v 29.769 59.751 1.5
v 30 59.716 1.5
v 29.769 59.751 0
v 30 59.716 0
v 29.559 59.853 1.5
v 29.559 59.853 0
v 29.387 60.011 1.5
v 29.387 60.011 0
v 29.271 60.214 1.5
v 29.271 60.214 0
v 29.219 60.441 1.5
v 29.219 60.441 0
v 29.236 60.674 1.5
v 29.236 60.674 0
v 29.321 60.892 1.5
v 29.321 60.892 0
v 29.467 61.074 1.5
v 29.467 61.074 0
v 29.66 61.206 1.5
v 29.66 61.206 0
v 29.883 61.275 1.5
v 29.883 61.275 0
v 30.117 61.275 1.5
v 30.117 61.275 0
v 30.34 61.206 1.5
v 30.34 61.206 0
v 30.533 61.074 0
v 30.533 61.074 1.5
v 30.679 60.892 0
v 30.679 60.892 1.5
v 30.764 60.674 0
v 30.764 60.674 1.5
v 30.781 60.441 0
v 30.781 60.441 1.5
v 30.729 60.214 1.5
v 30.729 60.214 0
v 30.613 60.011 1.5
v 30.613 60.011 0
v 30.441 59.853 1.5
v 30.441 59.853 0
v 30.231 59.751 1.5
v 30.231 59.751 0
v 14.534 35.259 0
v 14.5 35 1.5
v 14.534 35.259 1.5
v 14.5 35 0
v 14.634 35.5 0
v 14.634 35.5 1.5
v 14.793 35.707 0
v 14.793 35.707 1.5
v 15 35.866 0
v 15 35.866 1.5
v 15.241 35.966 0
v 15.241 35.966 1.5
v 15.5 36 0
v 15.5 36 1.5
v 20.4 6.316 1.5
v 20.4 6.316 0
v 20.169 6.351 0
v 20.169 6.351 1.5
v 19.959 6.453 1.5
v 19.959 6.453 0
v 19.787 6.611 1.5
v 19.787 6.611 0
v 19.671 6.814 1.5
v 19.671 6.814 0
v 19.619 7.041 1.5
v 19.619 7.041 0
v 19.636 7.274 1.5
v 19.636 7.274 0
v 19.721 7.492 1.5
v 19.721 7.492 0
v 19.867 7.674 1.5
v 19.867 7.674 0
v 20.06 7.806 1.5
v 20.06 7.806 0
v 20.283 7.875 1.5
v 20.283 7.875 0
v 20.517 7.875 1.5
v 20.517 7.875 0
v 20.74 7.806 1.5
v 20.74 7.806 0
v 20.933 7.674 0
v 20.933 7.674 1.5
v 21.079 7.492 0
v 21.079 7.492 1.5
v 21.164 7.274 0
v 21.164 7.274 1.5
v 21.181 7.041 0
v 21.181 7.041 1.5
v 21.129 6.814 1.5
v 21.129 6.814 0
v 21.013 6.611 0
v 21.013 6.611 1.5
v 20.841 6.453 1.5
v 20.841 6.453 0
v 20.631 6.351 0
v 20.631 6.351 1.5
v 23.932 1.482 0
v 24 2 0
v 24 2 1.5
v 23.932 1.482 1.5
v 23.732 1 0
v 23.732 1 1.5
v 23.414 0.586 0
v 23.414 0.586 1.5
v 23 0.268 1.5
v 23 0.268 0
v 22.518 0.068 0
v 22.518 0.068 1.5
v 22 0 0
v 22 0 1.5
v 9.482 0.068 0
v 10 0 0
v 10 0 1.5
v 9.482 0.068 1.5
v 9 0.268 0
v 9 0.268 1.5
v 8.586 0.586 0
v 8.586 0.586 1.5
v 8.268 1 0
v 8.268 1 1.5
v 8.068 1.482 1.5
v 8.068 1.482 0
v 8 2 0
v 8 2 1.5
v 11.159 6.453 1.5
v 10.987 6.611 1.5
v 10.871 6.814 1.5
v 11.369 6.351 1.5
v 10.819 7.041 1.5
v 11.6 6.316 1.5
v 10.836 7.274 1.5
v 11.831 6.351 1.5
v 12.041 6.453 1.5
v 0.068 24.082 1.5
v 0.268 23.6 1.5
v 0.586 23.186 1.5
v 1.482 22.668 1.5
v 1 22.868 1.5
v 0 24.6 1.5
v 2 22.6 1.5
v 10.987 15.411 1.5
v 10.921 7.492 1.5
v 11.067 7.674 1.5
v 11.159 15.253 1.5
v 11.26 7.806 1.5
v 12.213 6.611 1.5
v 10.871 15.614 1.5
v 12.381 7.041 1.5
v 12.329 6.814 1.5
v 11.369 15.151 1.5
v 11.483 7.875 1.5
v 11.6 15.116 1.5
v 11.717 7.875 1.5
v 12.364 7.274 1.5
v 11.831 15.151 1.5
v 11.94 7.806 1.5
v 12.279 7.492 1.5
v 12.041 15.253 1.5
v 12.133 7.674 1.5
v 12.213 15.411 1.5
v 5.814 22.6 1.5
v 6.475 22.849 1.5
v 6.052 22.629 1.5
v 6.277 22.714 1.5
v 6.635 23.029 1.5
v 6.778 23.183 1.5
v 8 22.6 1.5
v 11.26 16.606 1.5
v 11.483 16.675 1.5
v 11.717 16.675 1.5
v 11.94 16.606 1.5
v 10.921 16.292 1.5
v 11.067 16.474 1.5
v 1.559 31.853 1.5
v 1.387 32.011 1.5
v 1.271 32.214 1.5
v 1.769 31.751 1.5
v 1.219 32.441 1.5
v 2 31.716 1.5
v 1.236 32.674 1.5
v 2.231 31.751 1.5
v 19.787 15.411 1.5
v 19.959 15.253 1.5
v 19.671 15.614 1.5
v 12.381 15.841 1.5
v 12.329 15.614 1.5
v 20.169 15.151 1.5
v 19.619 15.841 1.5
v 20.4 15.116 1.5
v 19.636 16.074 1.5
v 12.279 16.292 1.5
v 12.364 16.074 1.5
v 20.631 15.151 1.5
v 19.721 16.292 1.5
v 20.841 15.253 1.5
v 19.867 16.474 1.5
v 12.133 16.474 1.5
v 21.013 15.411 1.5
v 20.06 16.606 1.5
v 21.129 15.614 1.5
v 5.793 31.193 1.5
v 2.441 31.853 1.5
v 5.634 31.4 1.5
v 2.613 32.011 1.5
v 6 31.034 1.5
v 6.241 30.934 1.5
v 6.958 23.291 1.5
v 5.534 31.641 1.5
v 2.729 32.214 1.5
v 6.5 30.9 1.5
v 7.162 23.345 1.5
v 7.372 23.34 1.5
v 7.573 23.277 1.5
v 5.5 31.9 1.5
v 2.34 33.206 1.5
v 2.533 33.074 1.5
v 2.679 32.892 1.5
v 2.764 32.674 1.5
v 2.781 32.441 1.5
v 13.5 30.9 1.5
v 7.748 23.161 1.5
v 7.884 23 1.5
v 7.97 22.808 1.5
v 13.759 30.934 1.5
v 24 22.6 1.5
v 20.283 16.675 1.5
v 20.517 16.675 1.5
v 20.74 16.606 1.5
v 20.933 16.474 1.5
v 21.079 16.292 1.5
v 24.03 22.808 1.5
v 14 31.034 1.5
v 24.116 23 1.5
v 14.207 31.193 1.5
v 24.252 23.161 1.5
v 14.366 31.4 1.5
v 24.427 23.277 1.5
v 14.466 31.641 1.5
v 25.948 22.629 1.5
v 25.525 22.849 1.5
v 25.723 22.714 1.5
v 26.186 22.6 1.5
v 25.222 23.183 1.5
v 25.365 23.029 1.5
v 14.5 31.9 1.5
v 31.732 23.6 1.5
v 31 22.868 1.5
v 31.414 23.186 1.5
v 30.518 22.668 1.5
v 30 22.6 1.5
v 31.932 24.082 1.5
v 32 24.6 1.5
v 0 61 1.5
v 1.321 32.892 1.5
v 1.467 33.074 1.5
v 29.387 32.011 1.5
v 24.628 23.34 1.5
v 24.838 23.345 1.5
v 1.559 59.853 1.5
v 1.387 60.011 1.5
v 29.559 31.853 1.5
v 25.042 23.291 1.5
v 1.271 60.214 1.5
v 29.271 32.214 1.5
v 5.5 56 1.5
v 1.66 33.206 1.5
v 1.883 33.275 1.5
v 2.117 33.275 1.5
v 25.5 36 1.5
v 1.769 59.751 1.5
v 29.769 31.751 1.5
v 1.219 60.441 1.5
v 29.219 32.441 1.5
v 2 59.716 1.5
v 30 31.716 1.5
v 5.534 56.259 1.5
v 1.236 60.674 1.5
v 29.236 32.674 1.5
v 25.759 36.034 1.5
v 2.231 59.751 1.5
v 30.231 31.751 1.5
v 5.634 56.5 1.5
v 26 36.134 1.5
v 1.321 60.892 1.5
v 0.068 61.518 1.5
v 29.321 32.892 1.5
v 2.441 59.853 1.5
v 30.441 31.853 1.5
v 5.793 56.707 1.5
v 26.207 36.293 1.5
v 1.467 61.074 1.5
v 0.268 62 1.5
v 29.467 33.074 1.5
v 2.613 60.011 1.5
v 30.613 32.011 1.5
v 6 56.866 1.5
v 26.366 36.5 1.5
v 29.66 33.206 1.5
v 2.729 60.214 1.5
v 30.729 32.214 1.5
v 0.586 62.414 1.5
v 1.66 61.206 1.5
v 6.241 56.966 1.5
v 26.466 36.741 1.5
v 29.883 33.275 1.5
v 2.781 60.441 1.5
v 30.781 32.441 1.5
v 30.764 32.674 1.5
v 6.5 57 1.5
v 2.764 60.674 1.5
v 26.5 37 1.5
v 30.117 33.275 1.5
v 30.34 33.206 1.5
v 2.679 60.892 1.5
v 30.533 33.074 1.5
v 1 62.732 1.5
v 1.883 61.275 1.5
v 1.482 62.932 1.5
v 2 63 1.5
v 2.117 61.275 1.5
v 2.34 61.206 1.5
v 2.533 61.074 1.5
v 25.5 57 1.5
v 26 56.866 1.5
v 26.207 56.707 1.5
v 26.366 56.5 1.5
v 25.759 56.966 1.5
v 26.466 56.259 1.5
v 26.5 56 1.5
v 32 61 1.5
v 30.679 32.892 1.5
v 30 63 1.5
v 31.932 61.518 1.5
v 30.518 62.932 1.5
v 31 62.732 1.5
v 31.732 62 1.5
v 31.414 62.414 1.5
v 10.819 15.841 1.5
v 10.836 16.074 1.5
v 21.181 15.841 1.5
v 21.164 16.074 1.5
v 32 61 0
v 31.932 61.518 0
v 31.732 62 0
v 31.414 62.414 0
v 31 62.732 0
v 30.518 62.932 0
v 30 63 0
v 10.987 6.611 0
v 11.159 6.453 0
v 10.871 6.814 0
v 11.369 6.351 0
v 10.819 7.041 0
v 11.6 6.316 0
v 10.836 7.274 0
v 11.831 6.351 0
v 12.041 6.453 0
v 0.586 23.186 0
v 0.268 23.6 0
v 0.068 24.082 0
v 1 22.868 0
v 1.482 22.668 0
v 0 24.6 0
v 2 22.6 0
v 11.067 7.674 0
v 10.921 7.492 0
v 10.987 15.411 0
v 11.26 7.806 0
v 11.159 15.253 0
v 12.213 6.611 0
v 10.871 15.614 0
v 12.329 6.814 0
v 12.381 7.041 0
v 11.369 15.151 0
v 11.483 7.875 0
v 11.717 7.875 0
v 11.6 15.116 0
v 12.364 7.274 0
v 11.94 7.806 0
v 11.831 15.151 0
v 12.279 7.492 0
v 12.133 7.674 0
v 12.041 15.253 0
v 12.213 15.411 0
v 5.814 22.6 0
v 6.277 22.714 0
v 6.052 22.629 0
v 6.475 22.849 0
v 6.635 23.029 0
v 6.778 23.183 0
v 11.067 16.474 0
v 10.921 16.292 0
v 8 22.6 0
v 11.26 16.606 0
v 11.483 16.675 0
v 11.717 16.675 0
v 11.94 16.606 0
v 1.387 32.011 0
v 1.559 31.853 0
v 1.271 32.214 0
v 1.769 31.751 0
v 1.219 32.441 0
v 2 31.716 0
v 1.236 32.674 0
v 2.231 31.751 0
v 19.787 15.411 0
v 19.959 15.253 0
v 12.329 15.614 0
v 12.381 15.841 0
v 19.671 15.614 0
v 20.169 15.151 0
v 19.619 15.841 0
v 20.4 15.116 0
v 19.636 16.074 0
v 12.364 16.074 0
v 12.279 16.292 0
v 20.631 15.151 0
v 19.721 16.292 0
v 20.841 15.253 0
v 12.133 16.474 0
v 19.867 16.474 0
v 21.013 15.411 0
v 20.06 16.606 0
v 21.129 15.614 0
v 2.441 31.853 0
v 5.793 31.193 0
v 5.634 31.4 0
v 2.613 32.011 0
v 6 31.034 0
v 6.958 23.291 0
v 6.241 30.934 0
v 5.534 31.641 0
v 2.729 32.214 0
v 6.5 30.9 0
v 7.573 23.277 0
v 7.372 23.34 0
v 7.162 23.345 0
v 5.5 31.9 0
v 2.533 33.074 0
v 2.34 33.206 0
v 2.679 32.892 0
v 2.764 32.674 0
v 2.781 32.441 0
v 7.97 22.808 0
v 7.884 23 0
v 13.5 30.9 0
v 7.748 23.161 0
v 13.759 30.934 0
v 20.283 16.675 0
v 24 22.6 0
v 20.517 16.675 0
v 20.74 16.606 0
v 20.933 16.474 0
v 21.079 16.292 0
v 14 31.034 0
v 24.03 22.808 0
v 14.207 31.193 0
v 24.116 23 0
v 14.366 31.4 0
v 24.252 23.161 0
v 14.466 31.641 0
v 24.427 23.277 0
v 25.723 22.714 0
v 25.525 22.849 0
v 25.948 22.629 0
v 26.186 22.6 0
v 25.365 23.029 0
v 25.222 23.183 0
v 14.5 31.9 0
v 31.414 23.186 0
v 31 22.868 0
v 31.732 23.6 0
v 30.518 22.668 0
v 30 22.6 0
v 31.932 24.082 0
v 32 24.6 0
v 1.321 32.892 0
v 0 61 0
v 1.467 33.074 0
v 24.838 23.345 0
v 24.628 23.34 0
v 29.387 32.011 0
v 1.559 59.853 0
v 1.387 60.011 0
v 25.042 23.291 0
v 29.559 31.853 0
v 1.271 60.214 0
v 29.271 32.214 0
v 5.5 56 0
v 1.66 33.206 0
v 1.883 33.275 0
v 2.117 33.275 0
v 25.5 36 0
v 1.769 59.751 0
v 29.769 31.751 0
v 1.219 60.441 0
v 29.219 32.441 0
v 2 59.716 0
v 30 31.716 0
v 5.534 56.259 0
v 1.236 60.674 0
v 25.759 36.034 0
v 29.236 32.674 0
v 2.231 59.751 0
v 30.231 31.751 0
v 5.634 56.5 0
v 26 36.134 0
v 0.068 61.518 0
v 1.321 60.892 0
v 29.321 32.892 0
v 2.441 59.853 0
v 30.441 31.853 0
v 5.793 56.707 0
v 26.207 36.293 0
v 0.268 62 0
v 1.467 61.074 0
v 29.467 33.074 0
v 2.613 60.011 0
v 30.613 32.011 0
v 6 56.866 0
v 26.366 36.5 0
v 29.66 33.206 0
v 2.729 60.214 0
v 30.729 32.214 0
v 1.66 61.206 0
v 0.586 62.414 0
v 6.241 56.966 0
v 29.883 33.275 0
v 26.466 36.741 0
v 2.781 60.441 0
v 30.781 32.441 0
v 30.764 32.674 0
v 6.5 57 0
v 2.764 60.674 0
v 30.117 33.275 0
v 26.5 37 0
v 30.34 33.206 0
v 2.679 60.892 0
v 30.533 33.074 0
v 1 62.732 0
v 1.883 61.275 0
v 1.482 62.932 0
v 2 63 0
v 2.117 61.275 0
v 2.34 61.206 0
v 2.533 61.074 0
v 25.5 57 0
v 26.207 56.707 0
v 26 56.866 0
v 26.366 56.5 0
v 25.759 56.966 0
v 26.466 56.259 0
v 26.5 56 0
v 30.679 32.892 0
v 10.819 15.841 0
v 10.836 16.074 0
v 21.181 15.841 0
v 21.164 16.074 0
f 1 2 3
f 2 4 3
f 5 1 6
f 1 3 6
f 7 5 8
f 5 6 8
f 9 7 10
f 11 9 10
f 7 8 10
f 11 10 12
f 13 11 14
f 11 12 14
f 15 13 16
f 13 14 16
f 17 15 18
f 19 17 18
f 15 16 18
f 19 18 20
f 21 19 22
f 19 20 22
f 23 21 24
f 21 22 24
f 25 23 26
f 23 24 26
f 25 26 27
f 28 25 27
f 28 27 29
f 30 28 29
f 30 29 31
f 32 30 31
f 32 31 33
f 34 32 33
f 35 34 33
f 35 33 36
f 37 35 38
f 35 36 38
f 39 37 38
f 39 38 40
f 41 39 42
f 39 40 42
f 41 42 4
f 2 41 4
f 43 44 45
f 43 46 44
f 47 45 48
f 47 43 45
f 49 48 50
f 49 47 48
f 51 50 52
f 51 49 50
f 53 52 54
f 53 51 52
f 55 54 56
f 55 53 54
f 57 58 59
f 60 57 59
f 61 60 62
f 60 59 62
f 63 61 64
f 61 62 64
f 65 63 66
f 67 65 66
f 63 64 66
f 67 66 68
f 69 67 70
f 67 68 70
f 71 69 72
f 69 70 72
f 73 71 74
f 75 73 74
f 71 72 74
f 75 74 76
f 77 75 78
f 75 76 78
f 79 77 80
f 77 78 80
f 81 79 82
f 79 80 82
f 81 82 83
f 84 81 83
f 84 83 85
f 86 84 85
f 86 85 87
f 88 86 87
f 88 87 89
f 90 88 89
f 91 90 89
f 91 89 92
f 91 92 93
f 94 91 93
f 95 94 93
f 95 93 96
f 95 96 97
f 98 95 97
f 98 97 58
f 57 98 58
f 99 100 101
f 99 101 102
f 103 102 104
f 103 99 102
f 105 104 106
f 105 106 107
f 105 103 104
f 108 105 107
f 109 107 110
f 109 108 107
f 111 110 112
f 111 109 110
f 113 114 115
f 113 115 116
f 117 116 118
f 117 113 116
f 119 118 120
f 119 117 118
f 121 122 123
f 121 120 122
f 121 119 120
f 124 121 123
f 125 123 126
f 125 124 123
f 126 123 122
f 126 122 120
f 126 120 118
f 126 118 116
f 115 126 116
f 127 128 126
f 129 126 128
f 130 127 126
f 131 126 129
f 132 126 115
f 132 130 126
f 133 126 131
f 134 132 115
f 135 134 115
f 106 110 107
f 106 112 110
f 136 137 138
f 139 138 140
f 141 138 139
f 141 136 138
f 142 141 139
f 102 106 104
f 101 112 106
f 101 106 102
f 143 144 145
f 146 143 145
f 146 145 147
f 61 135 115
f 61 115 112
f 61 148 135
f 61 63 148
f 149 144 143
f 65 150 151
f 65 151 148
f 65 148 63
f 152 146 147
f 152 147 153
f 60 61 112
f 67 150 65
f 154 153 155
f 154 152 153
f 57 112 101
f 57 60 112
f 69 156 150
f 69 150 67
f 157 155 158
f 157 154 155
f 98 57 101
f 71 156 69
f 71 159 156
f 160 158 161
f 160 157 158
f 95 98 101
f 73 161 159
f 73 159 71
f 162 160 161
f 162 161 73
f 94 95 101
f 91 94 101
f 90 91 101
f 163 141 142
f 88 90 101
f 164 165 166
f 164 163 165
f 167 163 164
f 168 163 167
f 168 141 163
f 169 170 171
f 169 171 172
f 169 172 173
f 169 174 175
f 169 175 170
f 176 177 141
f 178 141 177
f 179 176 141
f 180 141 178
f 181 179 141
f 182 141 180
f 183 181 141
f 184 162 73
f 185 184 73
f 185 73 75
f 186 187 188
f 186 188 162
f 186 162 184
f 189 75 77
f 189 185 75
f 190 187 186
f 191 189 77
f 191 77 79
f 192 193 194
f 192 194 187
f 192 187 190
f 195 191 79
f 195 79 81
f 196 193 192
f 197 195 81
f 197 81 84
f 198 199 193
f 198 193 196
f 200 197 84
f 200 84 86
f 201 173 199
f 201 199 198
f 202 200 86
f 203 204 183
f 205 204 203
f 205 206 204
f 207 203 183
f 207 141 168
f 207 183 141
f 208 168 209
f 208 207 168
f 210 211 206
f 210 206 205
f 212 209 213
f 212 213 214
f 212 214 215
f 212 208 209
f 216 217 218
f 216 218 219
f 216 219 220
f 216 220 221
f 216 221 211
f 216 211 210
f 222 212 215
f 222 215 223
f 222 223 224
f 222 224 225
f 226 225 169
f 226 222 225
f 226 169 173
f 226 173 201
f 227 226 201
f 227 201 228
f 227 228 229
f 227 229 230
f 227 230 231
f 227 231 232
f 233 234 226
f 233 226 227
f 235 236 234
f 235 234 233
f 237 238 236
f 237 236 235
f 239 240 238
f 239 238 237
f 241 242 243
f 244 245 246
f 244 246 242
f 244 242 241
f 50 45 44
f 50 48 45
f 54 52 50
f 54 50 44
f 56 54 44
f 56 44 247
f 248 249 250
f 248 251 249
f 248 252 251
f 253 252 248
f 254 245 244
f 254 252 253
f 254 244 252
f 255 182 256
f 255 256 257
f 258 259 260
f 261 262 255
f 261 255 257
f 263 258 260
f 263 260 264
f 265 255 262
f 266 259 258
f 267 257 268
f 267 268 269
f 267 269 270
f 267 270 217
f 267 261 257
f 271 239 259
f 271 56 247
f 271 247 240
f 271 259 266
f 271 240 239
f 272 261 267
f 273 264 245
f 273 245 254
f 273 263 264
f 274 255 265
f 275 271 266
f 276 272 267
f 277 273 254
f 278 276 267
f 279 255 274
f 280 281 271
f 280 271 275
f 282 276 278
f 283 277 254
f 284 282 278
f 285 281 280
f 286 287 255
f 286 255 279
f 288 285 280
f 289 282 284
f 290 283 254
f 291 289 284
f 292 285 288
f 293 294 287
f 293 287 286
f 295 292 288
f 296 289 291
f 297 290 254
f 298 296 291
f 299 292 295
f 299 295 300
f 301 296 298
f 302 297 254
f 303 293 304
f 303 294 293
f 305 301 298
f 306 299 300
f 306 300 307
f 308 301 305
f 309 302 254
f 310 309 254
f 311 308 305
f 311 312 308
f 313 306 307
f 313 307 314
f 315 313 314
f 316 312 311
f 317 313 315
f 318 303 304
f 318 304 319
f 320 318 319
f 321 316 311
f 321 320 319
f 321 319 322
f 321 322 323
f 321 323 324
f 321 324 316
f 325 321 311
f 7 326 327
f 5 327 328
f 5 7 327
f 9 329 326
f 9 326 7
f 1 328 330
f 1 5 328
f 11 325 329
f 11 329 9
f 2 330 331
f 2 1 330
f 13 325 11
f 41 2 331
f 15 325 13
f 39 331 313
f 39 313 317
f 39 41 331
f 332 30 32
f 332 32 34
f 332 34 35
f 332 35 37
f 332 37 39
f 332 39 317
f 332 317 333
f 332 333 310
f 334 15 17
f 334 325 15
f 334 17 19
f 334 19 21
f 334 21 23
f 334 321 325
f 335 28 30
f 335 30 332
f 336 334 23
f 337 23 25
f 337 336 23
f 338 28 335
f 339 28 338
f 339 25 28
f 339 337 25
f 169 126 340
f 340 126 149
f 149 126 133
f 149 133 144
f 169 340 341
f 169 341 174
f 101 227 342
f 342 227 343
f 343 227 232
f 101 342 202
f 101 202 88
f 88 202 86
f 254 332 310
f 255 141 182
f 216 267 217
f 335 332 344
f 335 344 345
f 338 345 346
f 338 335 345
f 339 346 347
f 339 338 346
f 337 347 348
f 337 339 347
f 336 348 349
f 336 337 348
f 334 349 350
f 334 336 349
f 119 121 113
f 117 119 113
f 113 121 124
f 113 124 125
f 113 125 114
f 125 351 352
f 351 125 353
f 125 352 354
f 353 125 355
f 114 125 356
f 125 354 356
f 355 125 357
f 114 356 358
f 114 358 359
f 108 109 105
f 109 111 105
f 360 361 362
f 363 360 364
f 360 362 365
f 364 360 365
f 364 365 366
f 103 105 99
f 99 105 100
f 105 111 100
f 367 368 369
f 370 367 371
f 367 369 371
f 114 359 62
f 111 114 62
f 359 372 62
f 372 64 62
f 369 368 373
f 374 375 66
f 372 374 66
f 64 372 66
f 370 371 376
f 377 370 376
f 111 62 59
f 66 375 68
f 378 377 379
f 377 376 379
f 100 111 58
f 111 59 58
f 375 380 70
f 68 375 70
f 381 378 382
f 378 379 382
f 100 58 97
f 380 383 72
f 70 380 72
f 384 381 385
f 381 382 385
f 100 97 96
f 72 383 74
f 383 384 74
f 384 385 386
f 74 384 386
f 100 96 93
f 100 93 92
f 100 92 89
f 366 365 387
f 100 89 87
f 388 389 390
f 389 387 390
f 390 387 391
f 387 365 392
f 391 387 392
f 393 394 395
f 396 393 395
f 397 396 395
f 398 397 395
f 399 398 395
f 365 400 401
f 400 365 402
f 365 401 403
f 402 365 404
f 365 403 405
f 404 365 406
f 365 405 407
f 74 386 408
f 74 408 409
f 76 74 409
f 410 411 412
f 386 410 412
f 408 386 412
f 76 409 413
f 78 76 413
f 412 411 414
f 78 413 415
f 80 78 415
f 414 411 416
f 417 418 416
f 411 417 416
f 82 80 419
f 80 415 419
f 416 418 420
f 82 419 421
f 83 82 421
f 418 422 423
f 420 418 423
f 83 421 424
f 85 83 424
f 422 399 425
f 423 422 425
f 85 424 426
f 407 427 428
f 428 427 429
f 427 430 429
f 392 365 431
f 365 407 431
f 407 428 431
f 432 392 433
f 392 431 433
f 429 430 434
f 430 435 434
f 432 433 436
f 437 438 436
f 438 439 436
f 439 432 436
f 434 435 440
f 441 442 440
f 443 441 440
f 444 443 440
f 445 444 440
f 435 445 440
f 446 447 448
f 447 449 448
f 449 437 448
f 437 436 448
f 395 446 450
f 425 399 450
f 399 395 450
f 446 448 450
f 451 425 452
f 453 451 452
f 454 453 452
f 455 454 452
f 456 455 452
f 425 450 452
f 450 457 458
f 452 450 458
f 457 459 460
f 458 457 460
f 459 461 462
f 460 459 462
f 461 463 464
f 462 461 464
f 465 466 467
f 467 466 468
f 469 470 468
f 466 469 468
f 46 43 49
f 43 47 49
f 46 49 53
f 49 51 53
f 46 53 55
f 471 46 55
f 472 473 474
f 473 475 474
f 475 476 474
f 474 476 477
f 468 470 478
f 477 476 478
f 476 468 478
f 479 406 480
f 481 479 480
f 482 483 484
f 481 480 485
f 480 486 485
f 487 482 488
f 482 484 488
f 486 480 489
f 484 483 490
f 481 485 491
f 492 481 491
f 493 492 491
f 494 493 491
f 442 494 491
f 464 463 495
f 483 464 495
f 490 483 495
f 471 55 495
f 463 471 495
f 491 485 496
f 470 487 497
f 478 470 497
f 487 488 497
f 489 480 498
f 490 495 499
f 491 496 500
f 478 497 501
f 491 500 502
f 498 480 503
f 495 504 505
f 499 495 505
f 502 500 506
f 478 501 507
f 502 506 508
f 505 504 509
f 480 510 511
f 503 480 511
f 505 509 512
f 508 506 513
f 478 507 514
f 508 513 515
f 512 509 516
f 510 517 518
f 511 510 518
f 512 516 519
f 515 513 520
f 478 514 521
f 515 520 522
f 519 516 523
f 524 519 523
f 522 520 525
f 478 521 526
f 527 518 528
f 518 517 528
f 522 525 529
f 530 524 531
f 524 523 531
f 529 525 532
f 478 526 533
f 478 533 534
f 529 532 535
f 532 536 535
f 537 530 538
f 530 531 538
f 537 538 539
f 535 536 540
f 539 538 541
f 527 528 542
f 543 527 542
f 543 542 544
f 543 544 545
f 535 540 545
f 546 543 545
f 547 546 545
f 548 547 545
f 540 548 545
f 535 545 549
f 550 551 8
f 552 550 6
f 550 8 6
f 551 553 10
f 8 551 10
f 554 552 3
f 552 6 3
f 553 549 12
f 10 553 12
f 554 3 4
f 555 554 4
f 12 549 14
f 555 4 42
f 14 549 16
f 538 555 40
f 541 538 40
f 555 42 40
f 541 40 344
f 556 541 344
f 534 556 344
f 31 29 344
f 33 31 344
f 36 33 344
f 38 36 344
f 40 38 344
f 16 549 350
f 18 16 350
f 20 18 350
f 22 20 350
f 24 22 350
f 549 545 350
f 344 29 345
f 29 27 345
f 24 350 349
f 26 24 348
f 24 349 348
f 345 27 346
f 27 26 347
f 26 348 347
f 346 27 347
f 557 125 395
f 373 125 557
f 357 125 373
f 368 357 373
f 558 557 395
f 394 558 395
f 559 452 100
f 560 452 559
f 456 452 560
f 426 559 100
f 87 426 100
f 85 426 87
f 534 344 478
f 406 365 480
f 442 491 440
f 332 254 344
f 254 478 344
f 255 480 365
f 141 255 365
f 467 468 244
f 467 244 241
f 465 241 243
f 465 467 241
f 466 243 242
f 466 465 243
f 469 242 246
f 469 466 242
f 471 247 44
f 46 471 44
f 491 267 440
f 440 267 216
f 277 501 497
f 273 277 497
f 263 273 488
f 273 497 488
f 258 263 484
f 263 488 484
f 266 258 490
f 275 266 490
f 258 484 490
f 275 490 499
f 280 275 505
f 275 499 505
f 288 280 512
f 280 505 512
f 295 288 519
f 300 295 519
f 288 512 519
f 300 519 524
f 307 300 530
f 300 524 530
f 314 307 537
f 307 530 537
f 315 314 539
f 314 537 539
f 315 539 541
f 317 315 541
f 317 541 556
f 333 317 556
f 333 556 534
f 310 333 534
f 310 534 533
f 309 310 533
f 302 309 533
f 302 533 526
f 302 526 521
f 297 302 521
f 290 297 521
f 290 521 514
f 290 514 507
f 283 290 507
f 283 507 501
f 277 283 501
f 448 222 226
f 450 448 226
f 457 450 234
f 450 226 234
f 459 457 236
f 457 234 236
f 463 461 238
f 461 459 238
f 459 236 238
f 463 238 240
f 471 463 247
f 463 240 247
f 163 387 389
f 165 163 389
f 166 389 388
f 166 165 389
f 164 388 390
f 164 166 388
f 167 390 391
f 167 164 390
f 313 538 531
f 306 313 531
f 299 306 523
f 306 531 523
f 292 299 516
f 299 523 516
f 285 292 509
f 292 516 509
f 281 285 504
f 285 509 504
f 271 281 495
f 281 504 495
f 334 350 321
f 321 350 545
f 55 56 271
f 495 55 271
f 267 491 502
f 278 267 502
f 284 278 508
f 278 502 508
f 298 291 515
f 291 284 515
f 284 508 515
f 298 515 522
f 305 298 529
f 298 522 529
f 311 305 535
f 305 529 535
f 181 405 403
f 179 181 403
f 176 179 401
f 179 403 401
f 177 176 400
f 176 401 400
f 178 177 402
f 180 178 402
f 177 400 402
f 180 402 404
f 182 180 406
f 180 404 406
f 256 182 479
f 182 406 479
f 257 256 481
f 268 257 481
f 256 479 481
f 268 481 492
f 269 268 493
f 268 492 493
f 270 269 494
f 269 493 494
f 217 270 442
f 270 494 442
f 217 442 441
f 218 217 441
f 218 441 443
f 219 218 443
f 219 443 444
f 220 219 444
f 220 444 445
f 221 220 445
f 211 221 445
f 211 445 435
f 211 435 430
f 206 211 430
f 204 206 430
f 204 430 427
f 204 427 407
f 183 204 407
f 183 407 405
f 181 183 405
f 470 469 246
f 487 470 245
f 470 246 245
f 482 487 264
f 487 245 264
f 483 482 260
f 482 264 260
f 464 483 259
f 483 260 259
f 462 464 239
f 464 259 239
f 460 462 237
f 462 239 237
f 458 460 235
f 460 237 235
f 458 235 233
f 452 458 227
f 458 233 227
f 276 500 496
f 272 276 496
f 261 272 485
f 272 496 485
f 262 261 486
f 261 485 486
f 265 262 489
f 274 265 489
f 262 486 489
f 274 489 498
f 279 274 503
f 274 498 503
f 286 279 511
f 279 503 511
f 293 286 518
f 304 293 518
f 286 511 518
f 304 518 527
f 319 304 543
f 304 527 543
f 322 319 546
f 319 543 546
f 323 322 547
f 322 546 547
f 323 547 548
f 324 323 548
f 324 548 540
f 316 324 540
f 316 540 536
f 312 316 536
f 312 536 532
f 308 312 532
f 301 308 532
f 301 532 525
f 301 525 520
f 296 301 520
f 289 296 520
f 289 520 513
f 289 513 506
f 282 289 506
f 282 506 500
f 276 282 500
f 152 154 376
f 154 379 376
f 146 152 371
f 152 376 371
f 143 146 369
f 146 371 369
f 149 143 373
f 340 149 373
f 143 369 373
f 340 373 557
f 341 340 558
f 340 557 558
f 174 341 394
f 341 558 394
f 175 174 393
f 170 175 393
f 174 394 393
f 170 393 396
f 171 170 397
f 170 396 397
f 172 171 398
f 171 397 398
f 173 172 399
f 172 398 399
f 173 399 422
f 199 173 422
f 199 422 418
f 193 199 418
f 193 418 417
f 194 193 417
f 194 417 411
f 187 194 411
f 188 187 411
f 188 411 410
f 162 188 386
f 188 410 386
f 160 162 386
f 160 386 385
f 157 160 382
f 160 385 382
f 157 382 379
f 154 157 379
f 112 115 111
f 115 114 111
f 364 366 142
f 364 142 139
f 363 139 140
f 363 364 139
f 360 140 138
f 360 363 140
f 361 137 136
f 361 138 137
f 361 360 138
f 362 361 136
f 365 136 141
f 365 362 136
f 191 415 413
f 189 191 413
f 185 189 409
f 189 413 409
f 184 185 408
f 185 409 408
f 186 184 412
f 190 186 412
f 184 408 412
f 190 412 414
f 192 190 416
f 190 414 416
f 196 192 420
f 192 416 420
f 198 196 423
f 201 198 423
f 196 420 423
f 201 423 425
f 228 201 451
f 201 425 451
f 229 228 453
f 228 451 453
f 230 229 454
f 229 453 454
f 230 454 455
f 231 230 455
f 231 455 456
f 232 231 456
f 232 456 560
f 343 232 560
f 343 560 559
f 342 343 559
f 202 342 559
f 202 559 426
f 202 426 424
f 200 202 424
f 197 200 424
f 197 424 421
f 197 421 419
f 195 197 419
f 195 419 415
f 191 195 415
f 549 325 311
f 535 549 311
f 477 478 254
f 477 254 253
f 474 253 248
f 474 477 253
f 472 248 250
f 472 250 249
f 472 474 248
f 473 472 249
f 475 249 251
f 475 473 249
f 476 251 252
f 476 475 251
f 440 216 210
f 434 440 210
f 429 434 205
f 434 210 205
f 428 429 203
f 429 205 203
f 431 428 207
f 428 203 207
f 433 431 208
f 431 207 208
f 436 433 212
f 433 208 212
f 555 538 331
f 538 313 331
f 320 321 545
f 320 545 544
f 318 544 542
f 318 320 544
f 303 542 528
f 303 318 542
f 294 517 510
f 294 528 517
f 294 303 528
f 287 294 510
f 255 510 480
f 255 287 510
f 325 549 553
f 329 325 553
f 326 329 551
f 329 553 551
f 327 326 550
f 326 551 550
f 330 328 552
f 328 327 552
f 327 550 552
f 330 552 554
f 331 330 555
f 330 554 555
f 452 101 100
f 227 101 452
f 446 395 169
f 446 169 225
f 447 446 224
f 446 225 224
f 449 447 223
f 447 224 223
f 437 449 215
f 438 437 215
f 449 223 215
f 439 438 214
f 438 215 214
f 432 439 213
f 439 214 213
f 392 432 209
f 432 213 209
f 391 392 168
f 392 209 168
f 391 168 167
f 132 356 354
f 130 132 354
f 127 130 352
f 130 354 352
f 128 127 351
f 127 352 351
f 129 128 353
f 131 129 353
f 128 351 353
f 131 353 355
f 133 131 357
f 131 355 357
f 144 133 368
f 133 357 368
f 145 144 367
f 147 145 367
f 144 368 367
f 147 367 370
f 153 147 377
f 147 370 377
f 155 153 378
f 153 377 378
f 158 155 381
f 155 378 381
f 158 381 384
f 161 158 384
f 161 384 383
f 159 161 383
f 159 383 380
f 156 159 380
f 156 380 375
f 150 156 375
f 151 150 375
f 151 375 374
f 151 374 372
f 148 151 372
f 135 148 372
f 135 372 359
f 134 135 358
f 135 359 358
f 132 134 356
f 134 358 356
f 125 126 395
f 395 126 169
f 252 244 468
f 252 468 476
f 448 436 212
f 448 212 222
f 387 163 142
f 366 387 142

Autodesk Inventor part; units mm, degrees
ref_plane "YZ Plane" through (0, 0, 0) normal (1, 0, 0) x (0, 1, 0)
ref_plane "XZ Plane" through (0, 0, 0) normal (0, 1, 0) x (-1, 0, 0)
ref_plane "XY Plane" through (0, 0, 0) normal (0, 0, 1) x (1, 0, 0)
sketch "スケッチ1" plane through (0, 0, 0) normal (0, 0, 1) x (1, 0, 0)
  line L0 (0, 0) -> (32, 0)
  line L1 (32, 0) -> (32, 63)
  line L2 (32, 63) -> (0, 63)
  line L3 (0, 63) -> (0, 0)
  dimension "d0" = 32
  dimension "d1" = 63
extrude "押し出し1" add sketch "スケッチ1" along normal blind 1.5
sketch "スケッチ2" plane through (0, 0, 1.5) normal (0, 0, 1) x (1, 0, 0)
  line L0 (2, 60.5) -> (30, 60.5)
  line L1 (30, 60.5) -> (30, 32.5)
  line L2 (30, 32.5) -> (2, 32.5)
  line L3 (2, 32.5) -> (2, 60.5)
  line L4 (32, 63) -> (0, 63) projected
  line L5 (16, 63) -> (16, 60.5)
  point P0 (0, 0)
  dimension "d4" = 28
  dimension "d5" = 28
  dimension "d6" = 2.5
hole "穴1" at (30, 60.5, 1.5) at (2, 60.5, 1.5) at (30, 32.5, 1.5) at (2, 32.5, 1.5) direction (0, 0, -1) diameter 1.567 end through all thread size "M2x0.4" class "6H" standard "ISO Metric profile"
sketch "スケッチ3" plane through (0, 0, 1.5) normal (0, 0, 1) x (1, 0, 0)
  circle A0 centre (30, 32.5) radius 0.7835 projected
  circle A1 centre (30, 60.5) radius 0.7835 projected
  circle A2 centre (2, 60.5) radius 0.7835 projected
  circle A3 centre (2, 32.5) radius 0.7835 projected
  line L0 (0, 0) -> (32, 0) projected
  line L1 (32, 0) -> (32, 63) projected
  line L2 (32, 63) -> (0, 63) projected
  line L3 (0, 63) -> (0, 0) projected
  line L4 (0, 0) -> (8, 0)
  line L5 (8, 0) -> (8, 22.6)
  line L6 (8, 22.6) -> (0, 22.6)
  line L7 (0, 22.6) -> (0, 0)
  line L8 (0, 0) -> (32, 0) projected
  line L9 (16, 0) -> (16, 3.4564)
  line L10 (32, 0) -> (24, 0)
  line L11 (24, 0) -> (24, 22.6)
  line L12 (24, 22.6) -> (32, 22.6)
  line L13 (32, 22.6) -> (32, 0)
  dimension "d14" = 22.6
  dimension "d15" = 16
extrude "押し出し2" cut sketch "スケッチ3" against normal through all contours L3 L6 L5 L0 | L11 L12 L1 L0
sketch "スケッチ4" plane through (0, 0, 1.5) normal (0, 0, 1) x (1, 0, 0)
  line L0 (8, 22.6) -> (8, 0) projected
  line L1 (8, 0) -> (24, 0) projected
  line L2 (24, 0) -> (24, 22.6) projected
  line L3 (24, 22.6) -> (32, 22.6) projected
  line L4 (32, 22.6) -> (32, 63) projected
  line L5 (32, 63) -> (0, 63) projected
  line L6 (0, 63) -> (0, 22.6) projected
  line L7 (0, 22.6) -> (8, 22.6) projected
  circle A0 centre (30, 32.5) radius 0.7835 projected
  circle A1 centre (30, 60.5) radius 0.7835 projected
  circle A2 centre (2, 60.5) radius 0.7835 projected
  circle A3 centre (2, 32.5) radius 0.7835 projected
  line L8 (11.6, 15.9) -> (20.4, 15.9)
  line L9 (20.4, 15.9) -> (20.4, 7.1)
  line L10 (20.4, 7.1) -> (11.6, 7.1)
  line L11 (11.6, 7.1) -> (11.6, 15.9)
  line L12 (8, 0) -> (24, 0) projected
  line L13 (16, 0) -> (16, 7.1)
  line L14 (24, 0) -> (24, 22.6) projected
  line L15 (8, 0) -> (24, 0) projected
  point P0 (0, 0)
  dimension "d18" = 8.8
  dimension "d19" = 8.8
  dimension "d27" = 6.7
hole "穴2" at (20.4, 15.9, 1.5) at (20.4, 7.1, 1.5) at (11.6, 7.1, 1.5) at (11.6, 15.9, 1.5) direction (0, 0, -1) diameter 1.567 end through all thread size "M2x0.4" class "6H" standard "ISO Metric profile"
sketch "スケッチ5" plane through (0, 0, 0) normal (0, 0, -1) x (-1, 0, 0)
  line L0 (-6, 34.6) -> (-14, 34.6) projected
  line L1 (-14, 34.6) -> (-14, 31.4) projected
  line L2 (-14, 31.4) -> (-6, 31.4) projected
  line L3 (-6, 31.4) -> (-6, 34.6) projected
  line L4 (-14.5, 35.1) -> (-5.5, 35.1)
  line L5 (-5.5, 35.1) -> (-5.5, 30.9)
  line L6 (-5.5, 30.9) -> (-14.5, 30.9)
  line L7 (-14.5, 30.9) -> (-14.5, 35.1)
  point P0 (0, 0)
  dimension "d28" = 0.5
extrude "押し出し3" cut sketch "スケッチ5" against normal through all contours L3 L2 L1 L0 | L4 L5 L6 L7
fillet "フィレット1" radius 2 6 edges at (32, 63, 0.75) (0, 63, 0.75) (0, 22.6, 0.75) (32, 22.6, 0.75) (8, 0, 0.75) (24, 0, 0.75)
sketch "スケッチ6" plane through (0, 0, 1.5) normal (0, 0, 1) x (1, 0, 0)
  line L0 (14.5, 35.1) -> (14.5, 30.9) projected
  line L1 (14.5, 30.9) -> (5.5, 30.9) projected
  line L2 (5.5, 30.9) -> (5.5, 35.1) projected
  line L3 (5.5, 35.1) -> (14.5, 35.1) projected
  circle A0 centre (11.6, 7.1) radius 0.7835 projected
  circle A1 centre (20.4, 15.9) radius 0.7835 projected
  circle A2 centre (20.4, 7.1) radius 0.7835 projected
  circle A3 centre (11.6, 15.9) radius 0.7835 projected
  arc A4 (22, 0) -> (24, 2) centre (22, 2) ccw projected
  line L4 (24, 2) -> (24, 22.6) projected
  line L5 (24, 22.6) -> (30, 22.6) projected
  arc A5 (30, 22.6) -> (32, 24.6) centre (30, 24.6) ccw projected
  line L6 (32, 24.6) -> (32, 61) projected
  arc A6 (32, 61) -> (30, 63) centre (30, 61) ccw projected
  line L7 (30, 63) -> (2, 63) projected
  arc A7 (2, 63) -> (0, 61) centre (2, 61) ccw projected
  line L8 (0, 61) -> (0, 24.6) projected
  arc A8 (0, 24.6) -> (2, 22.6) centre (2, 24.6) ccw projected
  line L9 (2, 22.6) -> (8, 22.6) projected
  line L10 (8, 22.6) -> (8, 2) projected
  arc A9 (8, 2) -> (10, 0) centre (10, 2) ccw projected
  line L11 (10, 0) -> (22, 0) projected
  circle A10 centre (30, 32.5) radius 0.7835 projected
  circle A11 centre (30, 60.5) radius 0.7835 projected
  circle A12 centre (2, 60.5) radius 0.7835 projected
  circle A13 centre (2, 32.5) radius 0.7835 projected
  line L12 (8, 22.6) -> (2, 22.6) projected
  circle A14 centre (7.25, 22.6) radius 0.75
  line L13 (30, 22.6) -> (24, 22.6) projected
  circle A15 centre (24.75, 22.6) radius 0.75
  line L14 (8, 22.6) -> (8, 2) projected
  line L15 (24, 2) -> (24, 22.6) projected
  point P0 (0, 0)
  dimension "d34" = 1.5
  dimension "d35" = 1.5
extrude "押し出し4" cut sketch "スケッチ6" against normal through all contours A15 L5 | L5 A15 | A14 L9 | L9 A14
fillet "フィレット2" radius 1 4 edges at (8, 22.6, 0.75) (6.5, 22.6, 0.75) (25.5, 22.6, 0.75) (24, 22.6, 0.75)
sketch "スケッチ7" plane through (0, 0, 1.5) normal (0, 0, 1) x (1, 0, 0)
  arc A0 (25.3655, 23.0286) -> (26.1861, 22.6) centre (26.1861, 23.6) ccw projected
  line L0 (26.1861, 22.6) -> (30, 22.6) projected
  arc A1 (30, 22.6) -> (32, 24.6) centre (30, 24.6) ccw projected
  line L1 (32, 24.6) -> (32, 61) projected
  arc A2 (32, 61) -> (30, 63) centre (30, 61) ccw projected
  line L2 (30, 63) -> (2, 63) projected
  arc A3 (2, 63) -> (0, 61) centre (2, 61) ccw projected
  line L3 (0, 61) -> (0, 24.6) projected
  arc A4 (0, 24.6) -> (2, 22.6) centre (2, 24.6) ccw projected
  line L4 (2, 22.6) -> (5.8139, 22.6) projected
  arc A5 (5.8139, 22.6) -> (6.6345, 23.0286) centre (5.8139, 23.6) ccw projected
  arc A6 (8, 22.6) -> (6.6345, 23.0286) centre (7.25, 22.6) ccw projected
  line L5 (8, 22.6) -> (8, 2) projected
  arc A7 (8, 2) -> (10, 0) centre (10, 2) ccw projected
  line L6 (10, 0) -> (22, 0) projected
  arc A8 (22, 0) -> (24, 2) centre (22, 2) ccw projected
  line L7 (24, 2) -> (24, 22.6) projected
  arc A9 (25.3655, 23.0286) -> (24, 22.6) centre (24.75, 22.6) ccw projected
  line L8 (14.5, 35.1) -> (14.5, 30.9) projected
  line L9 (14.5, 30.9) -> (5.5, 30.9) projected
  line L10 (5.5, 30.9) -> (5.5, 35.1) projected
  line L11 (5.5, 35.1) -> (14.5, 35.1) projected
  circle A10 centre (11.6, 7.1) radius 0.7835 projected
  circle A11 centre (20.4, 15.9) radius 0.7835 projected
  circle A12 centre (20.4, 7.1) radius 0.7835 projected
  circle A13 centre (11.6, 15.9) radius 0.7835 projected
  circle A14 centre (30, 32.5) radius 0.7835 projected
  circle A15 centre (30, 60.5) radius 0.7835 projected
  circle A16 centre (2, 60.5) radius 0.7835 projected
  circle A17 centre (2, 32.5) radius 0.7835 projected
  circle A18 centre (2, 60.5) radius 0.7835 projected
  line L12 (2, 60.5) -> (30, 60.5)
  line L13 (30, 60.5) -> (30, 32.5)
  line L14 (30, 32.5) -> (2, 32.5)
  line L15 (2, 32.5) -> (2, 60.5)
  line L16 (26.5, 57) -> (5.5, 57)
  line L17 (5.5, 57) -> (5.5, 36)
  line L18 (5.5, 36) -> (26.5, 36)
  line L19 (26.5, 36) -> (26.5, 57)
  point P0 (0, 0)
  dimension "d38" = 21
extrude "押し出し5" cut sketch "スケッチ7" against normal through all contours L19 L18 L17 L16
sketch "スケッチ8" plane through (0, 0, 1.5) normal (0, 0, 1) x (1, 0, 0)
  line L0 (5.5, 36) -> (5.5, 57) projected
  line L1 (5.5, 57) -> (26.5, 57) projected
  line L2 (26.5, 57) -> (26.5, 36) projected
  line L3 (26.5, 36) -> (5.5, 36) projected
  arc A0 (25.3655, 23.0286) -> (26.1861, 22.6) centre (26.1861, 23.6) ccw projected
  line L4 (26.1861, 22.6) -> (30, 22.6) projected
  arc A1 (30, 22.6) -> (32, 24.6) centre (30, 24.6) ccw projected
  line L5 (32, 24.6) -> (32, 61) projected
  arc A2 (32, 61) -> (30, 63) centre (30, 61) ccw projected
  line L6 (30, 63) -> (2, 63) projected
  arc A3 (2, 63) -> (0, 61) centre (2, 61) ccw projected
  line L7 (0, 61) -> (0, 24.6) projected
  arc A4 (0, 24.6) -> (2, 22.6) centre (2, 24.6) ccw projected
  line L8 (2, 22.6) -> (5.8139, 22.6) projected
  arc A5 (5.8139, 22.6) -> (6.6345, 23.0286) centre (5.8139, 23.6) ccw projected
  arc A6 (8, 22.6) -> (6.6345, 23.0286) centre (7.25, 22.6) ccw projected
  line L9 (8, 22.6) -> (8, 2) projected
  arc A7 (8, 2) -> (10, 0) centre (10, 2) ccw projected
  line L10 (10, 0) -> (22, 0) projected
  arc A8 (22, 0) -> (24, 2) centre (22, 2) ccw projected
  line L11 (24, 2) -> (24, 22.6) projected
  arc A9 (25.3655, 23.0286) -> (24, 22.6) centre (24.75, 22.6) ccw projected
  line L12 (14.5, 35.1) -> (14.5, 30.9) projected
  line L13 (14.5, 30.9) -> (5.5, 30.9) projected
  line L14 (5.5, 30.9) -> (5.5, 35.1) projected
  line L15 (5.5, 35.1) -> (14.5, 35.1) projected
  circle A10 centre (11.6, 7.1) radius 0.7835 projected
  circle A11 centre (20.4, 15.9) radius 0.7835 projected
  circle A12 centre (20.4, 7.1) radius 0.7835 projected
  circle A13 centre (11.6, 15.9) radius 0.7835 projected
  circle A14 centre (30, 32.5) radius 0.7835 projected
  circle A15 centre (30, 60.5) radius 0.7835 projected
  circle A16 centre (2, 60.5) radius 0.7835 projected
  circle A17 centre (2, 32.5) radius 0.7835 projected
  line L16 (5.5, 36) -> (5.5, 35.1)
  line L17 (14.5, 35.1) -> (14.5, 36)
  point P0 (0, 0)
extrude "押し出し6" cut sketch "スケッチ8" against normal through all contours L3 L17 L15 L16
fillet "フィレット5" radius 1 6 edges at (5.5, 57, 0.75) (26.5, 57, 0.75) (26.5, 36, 0.75) (14.5, 30.9, 0.75) (5.5, 30.9, 0.75) (14.5, 36, 0.75)
properties part number "手先カメラ" material "アルミニウム 6061"
